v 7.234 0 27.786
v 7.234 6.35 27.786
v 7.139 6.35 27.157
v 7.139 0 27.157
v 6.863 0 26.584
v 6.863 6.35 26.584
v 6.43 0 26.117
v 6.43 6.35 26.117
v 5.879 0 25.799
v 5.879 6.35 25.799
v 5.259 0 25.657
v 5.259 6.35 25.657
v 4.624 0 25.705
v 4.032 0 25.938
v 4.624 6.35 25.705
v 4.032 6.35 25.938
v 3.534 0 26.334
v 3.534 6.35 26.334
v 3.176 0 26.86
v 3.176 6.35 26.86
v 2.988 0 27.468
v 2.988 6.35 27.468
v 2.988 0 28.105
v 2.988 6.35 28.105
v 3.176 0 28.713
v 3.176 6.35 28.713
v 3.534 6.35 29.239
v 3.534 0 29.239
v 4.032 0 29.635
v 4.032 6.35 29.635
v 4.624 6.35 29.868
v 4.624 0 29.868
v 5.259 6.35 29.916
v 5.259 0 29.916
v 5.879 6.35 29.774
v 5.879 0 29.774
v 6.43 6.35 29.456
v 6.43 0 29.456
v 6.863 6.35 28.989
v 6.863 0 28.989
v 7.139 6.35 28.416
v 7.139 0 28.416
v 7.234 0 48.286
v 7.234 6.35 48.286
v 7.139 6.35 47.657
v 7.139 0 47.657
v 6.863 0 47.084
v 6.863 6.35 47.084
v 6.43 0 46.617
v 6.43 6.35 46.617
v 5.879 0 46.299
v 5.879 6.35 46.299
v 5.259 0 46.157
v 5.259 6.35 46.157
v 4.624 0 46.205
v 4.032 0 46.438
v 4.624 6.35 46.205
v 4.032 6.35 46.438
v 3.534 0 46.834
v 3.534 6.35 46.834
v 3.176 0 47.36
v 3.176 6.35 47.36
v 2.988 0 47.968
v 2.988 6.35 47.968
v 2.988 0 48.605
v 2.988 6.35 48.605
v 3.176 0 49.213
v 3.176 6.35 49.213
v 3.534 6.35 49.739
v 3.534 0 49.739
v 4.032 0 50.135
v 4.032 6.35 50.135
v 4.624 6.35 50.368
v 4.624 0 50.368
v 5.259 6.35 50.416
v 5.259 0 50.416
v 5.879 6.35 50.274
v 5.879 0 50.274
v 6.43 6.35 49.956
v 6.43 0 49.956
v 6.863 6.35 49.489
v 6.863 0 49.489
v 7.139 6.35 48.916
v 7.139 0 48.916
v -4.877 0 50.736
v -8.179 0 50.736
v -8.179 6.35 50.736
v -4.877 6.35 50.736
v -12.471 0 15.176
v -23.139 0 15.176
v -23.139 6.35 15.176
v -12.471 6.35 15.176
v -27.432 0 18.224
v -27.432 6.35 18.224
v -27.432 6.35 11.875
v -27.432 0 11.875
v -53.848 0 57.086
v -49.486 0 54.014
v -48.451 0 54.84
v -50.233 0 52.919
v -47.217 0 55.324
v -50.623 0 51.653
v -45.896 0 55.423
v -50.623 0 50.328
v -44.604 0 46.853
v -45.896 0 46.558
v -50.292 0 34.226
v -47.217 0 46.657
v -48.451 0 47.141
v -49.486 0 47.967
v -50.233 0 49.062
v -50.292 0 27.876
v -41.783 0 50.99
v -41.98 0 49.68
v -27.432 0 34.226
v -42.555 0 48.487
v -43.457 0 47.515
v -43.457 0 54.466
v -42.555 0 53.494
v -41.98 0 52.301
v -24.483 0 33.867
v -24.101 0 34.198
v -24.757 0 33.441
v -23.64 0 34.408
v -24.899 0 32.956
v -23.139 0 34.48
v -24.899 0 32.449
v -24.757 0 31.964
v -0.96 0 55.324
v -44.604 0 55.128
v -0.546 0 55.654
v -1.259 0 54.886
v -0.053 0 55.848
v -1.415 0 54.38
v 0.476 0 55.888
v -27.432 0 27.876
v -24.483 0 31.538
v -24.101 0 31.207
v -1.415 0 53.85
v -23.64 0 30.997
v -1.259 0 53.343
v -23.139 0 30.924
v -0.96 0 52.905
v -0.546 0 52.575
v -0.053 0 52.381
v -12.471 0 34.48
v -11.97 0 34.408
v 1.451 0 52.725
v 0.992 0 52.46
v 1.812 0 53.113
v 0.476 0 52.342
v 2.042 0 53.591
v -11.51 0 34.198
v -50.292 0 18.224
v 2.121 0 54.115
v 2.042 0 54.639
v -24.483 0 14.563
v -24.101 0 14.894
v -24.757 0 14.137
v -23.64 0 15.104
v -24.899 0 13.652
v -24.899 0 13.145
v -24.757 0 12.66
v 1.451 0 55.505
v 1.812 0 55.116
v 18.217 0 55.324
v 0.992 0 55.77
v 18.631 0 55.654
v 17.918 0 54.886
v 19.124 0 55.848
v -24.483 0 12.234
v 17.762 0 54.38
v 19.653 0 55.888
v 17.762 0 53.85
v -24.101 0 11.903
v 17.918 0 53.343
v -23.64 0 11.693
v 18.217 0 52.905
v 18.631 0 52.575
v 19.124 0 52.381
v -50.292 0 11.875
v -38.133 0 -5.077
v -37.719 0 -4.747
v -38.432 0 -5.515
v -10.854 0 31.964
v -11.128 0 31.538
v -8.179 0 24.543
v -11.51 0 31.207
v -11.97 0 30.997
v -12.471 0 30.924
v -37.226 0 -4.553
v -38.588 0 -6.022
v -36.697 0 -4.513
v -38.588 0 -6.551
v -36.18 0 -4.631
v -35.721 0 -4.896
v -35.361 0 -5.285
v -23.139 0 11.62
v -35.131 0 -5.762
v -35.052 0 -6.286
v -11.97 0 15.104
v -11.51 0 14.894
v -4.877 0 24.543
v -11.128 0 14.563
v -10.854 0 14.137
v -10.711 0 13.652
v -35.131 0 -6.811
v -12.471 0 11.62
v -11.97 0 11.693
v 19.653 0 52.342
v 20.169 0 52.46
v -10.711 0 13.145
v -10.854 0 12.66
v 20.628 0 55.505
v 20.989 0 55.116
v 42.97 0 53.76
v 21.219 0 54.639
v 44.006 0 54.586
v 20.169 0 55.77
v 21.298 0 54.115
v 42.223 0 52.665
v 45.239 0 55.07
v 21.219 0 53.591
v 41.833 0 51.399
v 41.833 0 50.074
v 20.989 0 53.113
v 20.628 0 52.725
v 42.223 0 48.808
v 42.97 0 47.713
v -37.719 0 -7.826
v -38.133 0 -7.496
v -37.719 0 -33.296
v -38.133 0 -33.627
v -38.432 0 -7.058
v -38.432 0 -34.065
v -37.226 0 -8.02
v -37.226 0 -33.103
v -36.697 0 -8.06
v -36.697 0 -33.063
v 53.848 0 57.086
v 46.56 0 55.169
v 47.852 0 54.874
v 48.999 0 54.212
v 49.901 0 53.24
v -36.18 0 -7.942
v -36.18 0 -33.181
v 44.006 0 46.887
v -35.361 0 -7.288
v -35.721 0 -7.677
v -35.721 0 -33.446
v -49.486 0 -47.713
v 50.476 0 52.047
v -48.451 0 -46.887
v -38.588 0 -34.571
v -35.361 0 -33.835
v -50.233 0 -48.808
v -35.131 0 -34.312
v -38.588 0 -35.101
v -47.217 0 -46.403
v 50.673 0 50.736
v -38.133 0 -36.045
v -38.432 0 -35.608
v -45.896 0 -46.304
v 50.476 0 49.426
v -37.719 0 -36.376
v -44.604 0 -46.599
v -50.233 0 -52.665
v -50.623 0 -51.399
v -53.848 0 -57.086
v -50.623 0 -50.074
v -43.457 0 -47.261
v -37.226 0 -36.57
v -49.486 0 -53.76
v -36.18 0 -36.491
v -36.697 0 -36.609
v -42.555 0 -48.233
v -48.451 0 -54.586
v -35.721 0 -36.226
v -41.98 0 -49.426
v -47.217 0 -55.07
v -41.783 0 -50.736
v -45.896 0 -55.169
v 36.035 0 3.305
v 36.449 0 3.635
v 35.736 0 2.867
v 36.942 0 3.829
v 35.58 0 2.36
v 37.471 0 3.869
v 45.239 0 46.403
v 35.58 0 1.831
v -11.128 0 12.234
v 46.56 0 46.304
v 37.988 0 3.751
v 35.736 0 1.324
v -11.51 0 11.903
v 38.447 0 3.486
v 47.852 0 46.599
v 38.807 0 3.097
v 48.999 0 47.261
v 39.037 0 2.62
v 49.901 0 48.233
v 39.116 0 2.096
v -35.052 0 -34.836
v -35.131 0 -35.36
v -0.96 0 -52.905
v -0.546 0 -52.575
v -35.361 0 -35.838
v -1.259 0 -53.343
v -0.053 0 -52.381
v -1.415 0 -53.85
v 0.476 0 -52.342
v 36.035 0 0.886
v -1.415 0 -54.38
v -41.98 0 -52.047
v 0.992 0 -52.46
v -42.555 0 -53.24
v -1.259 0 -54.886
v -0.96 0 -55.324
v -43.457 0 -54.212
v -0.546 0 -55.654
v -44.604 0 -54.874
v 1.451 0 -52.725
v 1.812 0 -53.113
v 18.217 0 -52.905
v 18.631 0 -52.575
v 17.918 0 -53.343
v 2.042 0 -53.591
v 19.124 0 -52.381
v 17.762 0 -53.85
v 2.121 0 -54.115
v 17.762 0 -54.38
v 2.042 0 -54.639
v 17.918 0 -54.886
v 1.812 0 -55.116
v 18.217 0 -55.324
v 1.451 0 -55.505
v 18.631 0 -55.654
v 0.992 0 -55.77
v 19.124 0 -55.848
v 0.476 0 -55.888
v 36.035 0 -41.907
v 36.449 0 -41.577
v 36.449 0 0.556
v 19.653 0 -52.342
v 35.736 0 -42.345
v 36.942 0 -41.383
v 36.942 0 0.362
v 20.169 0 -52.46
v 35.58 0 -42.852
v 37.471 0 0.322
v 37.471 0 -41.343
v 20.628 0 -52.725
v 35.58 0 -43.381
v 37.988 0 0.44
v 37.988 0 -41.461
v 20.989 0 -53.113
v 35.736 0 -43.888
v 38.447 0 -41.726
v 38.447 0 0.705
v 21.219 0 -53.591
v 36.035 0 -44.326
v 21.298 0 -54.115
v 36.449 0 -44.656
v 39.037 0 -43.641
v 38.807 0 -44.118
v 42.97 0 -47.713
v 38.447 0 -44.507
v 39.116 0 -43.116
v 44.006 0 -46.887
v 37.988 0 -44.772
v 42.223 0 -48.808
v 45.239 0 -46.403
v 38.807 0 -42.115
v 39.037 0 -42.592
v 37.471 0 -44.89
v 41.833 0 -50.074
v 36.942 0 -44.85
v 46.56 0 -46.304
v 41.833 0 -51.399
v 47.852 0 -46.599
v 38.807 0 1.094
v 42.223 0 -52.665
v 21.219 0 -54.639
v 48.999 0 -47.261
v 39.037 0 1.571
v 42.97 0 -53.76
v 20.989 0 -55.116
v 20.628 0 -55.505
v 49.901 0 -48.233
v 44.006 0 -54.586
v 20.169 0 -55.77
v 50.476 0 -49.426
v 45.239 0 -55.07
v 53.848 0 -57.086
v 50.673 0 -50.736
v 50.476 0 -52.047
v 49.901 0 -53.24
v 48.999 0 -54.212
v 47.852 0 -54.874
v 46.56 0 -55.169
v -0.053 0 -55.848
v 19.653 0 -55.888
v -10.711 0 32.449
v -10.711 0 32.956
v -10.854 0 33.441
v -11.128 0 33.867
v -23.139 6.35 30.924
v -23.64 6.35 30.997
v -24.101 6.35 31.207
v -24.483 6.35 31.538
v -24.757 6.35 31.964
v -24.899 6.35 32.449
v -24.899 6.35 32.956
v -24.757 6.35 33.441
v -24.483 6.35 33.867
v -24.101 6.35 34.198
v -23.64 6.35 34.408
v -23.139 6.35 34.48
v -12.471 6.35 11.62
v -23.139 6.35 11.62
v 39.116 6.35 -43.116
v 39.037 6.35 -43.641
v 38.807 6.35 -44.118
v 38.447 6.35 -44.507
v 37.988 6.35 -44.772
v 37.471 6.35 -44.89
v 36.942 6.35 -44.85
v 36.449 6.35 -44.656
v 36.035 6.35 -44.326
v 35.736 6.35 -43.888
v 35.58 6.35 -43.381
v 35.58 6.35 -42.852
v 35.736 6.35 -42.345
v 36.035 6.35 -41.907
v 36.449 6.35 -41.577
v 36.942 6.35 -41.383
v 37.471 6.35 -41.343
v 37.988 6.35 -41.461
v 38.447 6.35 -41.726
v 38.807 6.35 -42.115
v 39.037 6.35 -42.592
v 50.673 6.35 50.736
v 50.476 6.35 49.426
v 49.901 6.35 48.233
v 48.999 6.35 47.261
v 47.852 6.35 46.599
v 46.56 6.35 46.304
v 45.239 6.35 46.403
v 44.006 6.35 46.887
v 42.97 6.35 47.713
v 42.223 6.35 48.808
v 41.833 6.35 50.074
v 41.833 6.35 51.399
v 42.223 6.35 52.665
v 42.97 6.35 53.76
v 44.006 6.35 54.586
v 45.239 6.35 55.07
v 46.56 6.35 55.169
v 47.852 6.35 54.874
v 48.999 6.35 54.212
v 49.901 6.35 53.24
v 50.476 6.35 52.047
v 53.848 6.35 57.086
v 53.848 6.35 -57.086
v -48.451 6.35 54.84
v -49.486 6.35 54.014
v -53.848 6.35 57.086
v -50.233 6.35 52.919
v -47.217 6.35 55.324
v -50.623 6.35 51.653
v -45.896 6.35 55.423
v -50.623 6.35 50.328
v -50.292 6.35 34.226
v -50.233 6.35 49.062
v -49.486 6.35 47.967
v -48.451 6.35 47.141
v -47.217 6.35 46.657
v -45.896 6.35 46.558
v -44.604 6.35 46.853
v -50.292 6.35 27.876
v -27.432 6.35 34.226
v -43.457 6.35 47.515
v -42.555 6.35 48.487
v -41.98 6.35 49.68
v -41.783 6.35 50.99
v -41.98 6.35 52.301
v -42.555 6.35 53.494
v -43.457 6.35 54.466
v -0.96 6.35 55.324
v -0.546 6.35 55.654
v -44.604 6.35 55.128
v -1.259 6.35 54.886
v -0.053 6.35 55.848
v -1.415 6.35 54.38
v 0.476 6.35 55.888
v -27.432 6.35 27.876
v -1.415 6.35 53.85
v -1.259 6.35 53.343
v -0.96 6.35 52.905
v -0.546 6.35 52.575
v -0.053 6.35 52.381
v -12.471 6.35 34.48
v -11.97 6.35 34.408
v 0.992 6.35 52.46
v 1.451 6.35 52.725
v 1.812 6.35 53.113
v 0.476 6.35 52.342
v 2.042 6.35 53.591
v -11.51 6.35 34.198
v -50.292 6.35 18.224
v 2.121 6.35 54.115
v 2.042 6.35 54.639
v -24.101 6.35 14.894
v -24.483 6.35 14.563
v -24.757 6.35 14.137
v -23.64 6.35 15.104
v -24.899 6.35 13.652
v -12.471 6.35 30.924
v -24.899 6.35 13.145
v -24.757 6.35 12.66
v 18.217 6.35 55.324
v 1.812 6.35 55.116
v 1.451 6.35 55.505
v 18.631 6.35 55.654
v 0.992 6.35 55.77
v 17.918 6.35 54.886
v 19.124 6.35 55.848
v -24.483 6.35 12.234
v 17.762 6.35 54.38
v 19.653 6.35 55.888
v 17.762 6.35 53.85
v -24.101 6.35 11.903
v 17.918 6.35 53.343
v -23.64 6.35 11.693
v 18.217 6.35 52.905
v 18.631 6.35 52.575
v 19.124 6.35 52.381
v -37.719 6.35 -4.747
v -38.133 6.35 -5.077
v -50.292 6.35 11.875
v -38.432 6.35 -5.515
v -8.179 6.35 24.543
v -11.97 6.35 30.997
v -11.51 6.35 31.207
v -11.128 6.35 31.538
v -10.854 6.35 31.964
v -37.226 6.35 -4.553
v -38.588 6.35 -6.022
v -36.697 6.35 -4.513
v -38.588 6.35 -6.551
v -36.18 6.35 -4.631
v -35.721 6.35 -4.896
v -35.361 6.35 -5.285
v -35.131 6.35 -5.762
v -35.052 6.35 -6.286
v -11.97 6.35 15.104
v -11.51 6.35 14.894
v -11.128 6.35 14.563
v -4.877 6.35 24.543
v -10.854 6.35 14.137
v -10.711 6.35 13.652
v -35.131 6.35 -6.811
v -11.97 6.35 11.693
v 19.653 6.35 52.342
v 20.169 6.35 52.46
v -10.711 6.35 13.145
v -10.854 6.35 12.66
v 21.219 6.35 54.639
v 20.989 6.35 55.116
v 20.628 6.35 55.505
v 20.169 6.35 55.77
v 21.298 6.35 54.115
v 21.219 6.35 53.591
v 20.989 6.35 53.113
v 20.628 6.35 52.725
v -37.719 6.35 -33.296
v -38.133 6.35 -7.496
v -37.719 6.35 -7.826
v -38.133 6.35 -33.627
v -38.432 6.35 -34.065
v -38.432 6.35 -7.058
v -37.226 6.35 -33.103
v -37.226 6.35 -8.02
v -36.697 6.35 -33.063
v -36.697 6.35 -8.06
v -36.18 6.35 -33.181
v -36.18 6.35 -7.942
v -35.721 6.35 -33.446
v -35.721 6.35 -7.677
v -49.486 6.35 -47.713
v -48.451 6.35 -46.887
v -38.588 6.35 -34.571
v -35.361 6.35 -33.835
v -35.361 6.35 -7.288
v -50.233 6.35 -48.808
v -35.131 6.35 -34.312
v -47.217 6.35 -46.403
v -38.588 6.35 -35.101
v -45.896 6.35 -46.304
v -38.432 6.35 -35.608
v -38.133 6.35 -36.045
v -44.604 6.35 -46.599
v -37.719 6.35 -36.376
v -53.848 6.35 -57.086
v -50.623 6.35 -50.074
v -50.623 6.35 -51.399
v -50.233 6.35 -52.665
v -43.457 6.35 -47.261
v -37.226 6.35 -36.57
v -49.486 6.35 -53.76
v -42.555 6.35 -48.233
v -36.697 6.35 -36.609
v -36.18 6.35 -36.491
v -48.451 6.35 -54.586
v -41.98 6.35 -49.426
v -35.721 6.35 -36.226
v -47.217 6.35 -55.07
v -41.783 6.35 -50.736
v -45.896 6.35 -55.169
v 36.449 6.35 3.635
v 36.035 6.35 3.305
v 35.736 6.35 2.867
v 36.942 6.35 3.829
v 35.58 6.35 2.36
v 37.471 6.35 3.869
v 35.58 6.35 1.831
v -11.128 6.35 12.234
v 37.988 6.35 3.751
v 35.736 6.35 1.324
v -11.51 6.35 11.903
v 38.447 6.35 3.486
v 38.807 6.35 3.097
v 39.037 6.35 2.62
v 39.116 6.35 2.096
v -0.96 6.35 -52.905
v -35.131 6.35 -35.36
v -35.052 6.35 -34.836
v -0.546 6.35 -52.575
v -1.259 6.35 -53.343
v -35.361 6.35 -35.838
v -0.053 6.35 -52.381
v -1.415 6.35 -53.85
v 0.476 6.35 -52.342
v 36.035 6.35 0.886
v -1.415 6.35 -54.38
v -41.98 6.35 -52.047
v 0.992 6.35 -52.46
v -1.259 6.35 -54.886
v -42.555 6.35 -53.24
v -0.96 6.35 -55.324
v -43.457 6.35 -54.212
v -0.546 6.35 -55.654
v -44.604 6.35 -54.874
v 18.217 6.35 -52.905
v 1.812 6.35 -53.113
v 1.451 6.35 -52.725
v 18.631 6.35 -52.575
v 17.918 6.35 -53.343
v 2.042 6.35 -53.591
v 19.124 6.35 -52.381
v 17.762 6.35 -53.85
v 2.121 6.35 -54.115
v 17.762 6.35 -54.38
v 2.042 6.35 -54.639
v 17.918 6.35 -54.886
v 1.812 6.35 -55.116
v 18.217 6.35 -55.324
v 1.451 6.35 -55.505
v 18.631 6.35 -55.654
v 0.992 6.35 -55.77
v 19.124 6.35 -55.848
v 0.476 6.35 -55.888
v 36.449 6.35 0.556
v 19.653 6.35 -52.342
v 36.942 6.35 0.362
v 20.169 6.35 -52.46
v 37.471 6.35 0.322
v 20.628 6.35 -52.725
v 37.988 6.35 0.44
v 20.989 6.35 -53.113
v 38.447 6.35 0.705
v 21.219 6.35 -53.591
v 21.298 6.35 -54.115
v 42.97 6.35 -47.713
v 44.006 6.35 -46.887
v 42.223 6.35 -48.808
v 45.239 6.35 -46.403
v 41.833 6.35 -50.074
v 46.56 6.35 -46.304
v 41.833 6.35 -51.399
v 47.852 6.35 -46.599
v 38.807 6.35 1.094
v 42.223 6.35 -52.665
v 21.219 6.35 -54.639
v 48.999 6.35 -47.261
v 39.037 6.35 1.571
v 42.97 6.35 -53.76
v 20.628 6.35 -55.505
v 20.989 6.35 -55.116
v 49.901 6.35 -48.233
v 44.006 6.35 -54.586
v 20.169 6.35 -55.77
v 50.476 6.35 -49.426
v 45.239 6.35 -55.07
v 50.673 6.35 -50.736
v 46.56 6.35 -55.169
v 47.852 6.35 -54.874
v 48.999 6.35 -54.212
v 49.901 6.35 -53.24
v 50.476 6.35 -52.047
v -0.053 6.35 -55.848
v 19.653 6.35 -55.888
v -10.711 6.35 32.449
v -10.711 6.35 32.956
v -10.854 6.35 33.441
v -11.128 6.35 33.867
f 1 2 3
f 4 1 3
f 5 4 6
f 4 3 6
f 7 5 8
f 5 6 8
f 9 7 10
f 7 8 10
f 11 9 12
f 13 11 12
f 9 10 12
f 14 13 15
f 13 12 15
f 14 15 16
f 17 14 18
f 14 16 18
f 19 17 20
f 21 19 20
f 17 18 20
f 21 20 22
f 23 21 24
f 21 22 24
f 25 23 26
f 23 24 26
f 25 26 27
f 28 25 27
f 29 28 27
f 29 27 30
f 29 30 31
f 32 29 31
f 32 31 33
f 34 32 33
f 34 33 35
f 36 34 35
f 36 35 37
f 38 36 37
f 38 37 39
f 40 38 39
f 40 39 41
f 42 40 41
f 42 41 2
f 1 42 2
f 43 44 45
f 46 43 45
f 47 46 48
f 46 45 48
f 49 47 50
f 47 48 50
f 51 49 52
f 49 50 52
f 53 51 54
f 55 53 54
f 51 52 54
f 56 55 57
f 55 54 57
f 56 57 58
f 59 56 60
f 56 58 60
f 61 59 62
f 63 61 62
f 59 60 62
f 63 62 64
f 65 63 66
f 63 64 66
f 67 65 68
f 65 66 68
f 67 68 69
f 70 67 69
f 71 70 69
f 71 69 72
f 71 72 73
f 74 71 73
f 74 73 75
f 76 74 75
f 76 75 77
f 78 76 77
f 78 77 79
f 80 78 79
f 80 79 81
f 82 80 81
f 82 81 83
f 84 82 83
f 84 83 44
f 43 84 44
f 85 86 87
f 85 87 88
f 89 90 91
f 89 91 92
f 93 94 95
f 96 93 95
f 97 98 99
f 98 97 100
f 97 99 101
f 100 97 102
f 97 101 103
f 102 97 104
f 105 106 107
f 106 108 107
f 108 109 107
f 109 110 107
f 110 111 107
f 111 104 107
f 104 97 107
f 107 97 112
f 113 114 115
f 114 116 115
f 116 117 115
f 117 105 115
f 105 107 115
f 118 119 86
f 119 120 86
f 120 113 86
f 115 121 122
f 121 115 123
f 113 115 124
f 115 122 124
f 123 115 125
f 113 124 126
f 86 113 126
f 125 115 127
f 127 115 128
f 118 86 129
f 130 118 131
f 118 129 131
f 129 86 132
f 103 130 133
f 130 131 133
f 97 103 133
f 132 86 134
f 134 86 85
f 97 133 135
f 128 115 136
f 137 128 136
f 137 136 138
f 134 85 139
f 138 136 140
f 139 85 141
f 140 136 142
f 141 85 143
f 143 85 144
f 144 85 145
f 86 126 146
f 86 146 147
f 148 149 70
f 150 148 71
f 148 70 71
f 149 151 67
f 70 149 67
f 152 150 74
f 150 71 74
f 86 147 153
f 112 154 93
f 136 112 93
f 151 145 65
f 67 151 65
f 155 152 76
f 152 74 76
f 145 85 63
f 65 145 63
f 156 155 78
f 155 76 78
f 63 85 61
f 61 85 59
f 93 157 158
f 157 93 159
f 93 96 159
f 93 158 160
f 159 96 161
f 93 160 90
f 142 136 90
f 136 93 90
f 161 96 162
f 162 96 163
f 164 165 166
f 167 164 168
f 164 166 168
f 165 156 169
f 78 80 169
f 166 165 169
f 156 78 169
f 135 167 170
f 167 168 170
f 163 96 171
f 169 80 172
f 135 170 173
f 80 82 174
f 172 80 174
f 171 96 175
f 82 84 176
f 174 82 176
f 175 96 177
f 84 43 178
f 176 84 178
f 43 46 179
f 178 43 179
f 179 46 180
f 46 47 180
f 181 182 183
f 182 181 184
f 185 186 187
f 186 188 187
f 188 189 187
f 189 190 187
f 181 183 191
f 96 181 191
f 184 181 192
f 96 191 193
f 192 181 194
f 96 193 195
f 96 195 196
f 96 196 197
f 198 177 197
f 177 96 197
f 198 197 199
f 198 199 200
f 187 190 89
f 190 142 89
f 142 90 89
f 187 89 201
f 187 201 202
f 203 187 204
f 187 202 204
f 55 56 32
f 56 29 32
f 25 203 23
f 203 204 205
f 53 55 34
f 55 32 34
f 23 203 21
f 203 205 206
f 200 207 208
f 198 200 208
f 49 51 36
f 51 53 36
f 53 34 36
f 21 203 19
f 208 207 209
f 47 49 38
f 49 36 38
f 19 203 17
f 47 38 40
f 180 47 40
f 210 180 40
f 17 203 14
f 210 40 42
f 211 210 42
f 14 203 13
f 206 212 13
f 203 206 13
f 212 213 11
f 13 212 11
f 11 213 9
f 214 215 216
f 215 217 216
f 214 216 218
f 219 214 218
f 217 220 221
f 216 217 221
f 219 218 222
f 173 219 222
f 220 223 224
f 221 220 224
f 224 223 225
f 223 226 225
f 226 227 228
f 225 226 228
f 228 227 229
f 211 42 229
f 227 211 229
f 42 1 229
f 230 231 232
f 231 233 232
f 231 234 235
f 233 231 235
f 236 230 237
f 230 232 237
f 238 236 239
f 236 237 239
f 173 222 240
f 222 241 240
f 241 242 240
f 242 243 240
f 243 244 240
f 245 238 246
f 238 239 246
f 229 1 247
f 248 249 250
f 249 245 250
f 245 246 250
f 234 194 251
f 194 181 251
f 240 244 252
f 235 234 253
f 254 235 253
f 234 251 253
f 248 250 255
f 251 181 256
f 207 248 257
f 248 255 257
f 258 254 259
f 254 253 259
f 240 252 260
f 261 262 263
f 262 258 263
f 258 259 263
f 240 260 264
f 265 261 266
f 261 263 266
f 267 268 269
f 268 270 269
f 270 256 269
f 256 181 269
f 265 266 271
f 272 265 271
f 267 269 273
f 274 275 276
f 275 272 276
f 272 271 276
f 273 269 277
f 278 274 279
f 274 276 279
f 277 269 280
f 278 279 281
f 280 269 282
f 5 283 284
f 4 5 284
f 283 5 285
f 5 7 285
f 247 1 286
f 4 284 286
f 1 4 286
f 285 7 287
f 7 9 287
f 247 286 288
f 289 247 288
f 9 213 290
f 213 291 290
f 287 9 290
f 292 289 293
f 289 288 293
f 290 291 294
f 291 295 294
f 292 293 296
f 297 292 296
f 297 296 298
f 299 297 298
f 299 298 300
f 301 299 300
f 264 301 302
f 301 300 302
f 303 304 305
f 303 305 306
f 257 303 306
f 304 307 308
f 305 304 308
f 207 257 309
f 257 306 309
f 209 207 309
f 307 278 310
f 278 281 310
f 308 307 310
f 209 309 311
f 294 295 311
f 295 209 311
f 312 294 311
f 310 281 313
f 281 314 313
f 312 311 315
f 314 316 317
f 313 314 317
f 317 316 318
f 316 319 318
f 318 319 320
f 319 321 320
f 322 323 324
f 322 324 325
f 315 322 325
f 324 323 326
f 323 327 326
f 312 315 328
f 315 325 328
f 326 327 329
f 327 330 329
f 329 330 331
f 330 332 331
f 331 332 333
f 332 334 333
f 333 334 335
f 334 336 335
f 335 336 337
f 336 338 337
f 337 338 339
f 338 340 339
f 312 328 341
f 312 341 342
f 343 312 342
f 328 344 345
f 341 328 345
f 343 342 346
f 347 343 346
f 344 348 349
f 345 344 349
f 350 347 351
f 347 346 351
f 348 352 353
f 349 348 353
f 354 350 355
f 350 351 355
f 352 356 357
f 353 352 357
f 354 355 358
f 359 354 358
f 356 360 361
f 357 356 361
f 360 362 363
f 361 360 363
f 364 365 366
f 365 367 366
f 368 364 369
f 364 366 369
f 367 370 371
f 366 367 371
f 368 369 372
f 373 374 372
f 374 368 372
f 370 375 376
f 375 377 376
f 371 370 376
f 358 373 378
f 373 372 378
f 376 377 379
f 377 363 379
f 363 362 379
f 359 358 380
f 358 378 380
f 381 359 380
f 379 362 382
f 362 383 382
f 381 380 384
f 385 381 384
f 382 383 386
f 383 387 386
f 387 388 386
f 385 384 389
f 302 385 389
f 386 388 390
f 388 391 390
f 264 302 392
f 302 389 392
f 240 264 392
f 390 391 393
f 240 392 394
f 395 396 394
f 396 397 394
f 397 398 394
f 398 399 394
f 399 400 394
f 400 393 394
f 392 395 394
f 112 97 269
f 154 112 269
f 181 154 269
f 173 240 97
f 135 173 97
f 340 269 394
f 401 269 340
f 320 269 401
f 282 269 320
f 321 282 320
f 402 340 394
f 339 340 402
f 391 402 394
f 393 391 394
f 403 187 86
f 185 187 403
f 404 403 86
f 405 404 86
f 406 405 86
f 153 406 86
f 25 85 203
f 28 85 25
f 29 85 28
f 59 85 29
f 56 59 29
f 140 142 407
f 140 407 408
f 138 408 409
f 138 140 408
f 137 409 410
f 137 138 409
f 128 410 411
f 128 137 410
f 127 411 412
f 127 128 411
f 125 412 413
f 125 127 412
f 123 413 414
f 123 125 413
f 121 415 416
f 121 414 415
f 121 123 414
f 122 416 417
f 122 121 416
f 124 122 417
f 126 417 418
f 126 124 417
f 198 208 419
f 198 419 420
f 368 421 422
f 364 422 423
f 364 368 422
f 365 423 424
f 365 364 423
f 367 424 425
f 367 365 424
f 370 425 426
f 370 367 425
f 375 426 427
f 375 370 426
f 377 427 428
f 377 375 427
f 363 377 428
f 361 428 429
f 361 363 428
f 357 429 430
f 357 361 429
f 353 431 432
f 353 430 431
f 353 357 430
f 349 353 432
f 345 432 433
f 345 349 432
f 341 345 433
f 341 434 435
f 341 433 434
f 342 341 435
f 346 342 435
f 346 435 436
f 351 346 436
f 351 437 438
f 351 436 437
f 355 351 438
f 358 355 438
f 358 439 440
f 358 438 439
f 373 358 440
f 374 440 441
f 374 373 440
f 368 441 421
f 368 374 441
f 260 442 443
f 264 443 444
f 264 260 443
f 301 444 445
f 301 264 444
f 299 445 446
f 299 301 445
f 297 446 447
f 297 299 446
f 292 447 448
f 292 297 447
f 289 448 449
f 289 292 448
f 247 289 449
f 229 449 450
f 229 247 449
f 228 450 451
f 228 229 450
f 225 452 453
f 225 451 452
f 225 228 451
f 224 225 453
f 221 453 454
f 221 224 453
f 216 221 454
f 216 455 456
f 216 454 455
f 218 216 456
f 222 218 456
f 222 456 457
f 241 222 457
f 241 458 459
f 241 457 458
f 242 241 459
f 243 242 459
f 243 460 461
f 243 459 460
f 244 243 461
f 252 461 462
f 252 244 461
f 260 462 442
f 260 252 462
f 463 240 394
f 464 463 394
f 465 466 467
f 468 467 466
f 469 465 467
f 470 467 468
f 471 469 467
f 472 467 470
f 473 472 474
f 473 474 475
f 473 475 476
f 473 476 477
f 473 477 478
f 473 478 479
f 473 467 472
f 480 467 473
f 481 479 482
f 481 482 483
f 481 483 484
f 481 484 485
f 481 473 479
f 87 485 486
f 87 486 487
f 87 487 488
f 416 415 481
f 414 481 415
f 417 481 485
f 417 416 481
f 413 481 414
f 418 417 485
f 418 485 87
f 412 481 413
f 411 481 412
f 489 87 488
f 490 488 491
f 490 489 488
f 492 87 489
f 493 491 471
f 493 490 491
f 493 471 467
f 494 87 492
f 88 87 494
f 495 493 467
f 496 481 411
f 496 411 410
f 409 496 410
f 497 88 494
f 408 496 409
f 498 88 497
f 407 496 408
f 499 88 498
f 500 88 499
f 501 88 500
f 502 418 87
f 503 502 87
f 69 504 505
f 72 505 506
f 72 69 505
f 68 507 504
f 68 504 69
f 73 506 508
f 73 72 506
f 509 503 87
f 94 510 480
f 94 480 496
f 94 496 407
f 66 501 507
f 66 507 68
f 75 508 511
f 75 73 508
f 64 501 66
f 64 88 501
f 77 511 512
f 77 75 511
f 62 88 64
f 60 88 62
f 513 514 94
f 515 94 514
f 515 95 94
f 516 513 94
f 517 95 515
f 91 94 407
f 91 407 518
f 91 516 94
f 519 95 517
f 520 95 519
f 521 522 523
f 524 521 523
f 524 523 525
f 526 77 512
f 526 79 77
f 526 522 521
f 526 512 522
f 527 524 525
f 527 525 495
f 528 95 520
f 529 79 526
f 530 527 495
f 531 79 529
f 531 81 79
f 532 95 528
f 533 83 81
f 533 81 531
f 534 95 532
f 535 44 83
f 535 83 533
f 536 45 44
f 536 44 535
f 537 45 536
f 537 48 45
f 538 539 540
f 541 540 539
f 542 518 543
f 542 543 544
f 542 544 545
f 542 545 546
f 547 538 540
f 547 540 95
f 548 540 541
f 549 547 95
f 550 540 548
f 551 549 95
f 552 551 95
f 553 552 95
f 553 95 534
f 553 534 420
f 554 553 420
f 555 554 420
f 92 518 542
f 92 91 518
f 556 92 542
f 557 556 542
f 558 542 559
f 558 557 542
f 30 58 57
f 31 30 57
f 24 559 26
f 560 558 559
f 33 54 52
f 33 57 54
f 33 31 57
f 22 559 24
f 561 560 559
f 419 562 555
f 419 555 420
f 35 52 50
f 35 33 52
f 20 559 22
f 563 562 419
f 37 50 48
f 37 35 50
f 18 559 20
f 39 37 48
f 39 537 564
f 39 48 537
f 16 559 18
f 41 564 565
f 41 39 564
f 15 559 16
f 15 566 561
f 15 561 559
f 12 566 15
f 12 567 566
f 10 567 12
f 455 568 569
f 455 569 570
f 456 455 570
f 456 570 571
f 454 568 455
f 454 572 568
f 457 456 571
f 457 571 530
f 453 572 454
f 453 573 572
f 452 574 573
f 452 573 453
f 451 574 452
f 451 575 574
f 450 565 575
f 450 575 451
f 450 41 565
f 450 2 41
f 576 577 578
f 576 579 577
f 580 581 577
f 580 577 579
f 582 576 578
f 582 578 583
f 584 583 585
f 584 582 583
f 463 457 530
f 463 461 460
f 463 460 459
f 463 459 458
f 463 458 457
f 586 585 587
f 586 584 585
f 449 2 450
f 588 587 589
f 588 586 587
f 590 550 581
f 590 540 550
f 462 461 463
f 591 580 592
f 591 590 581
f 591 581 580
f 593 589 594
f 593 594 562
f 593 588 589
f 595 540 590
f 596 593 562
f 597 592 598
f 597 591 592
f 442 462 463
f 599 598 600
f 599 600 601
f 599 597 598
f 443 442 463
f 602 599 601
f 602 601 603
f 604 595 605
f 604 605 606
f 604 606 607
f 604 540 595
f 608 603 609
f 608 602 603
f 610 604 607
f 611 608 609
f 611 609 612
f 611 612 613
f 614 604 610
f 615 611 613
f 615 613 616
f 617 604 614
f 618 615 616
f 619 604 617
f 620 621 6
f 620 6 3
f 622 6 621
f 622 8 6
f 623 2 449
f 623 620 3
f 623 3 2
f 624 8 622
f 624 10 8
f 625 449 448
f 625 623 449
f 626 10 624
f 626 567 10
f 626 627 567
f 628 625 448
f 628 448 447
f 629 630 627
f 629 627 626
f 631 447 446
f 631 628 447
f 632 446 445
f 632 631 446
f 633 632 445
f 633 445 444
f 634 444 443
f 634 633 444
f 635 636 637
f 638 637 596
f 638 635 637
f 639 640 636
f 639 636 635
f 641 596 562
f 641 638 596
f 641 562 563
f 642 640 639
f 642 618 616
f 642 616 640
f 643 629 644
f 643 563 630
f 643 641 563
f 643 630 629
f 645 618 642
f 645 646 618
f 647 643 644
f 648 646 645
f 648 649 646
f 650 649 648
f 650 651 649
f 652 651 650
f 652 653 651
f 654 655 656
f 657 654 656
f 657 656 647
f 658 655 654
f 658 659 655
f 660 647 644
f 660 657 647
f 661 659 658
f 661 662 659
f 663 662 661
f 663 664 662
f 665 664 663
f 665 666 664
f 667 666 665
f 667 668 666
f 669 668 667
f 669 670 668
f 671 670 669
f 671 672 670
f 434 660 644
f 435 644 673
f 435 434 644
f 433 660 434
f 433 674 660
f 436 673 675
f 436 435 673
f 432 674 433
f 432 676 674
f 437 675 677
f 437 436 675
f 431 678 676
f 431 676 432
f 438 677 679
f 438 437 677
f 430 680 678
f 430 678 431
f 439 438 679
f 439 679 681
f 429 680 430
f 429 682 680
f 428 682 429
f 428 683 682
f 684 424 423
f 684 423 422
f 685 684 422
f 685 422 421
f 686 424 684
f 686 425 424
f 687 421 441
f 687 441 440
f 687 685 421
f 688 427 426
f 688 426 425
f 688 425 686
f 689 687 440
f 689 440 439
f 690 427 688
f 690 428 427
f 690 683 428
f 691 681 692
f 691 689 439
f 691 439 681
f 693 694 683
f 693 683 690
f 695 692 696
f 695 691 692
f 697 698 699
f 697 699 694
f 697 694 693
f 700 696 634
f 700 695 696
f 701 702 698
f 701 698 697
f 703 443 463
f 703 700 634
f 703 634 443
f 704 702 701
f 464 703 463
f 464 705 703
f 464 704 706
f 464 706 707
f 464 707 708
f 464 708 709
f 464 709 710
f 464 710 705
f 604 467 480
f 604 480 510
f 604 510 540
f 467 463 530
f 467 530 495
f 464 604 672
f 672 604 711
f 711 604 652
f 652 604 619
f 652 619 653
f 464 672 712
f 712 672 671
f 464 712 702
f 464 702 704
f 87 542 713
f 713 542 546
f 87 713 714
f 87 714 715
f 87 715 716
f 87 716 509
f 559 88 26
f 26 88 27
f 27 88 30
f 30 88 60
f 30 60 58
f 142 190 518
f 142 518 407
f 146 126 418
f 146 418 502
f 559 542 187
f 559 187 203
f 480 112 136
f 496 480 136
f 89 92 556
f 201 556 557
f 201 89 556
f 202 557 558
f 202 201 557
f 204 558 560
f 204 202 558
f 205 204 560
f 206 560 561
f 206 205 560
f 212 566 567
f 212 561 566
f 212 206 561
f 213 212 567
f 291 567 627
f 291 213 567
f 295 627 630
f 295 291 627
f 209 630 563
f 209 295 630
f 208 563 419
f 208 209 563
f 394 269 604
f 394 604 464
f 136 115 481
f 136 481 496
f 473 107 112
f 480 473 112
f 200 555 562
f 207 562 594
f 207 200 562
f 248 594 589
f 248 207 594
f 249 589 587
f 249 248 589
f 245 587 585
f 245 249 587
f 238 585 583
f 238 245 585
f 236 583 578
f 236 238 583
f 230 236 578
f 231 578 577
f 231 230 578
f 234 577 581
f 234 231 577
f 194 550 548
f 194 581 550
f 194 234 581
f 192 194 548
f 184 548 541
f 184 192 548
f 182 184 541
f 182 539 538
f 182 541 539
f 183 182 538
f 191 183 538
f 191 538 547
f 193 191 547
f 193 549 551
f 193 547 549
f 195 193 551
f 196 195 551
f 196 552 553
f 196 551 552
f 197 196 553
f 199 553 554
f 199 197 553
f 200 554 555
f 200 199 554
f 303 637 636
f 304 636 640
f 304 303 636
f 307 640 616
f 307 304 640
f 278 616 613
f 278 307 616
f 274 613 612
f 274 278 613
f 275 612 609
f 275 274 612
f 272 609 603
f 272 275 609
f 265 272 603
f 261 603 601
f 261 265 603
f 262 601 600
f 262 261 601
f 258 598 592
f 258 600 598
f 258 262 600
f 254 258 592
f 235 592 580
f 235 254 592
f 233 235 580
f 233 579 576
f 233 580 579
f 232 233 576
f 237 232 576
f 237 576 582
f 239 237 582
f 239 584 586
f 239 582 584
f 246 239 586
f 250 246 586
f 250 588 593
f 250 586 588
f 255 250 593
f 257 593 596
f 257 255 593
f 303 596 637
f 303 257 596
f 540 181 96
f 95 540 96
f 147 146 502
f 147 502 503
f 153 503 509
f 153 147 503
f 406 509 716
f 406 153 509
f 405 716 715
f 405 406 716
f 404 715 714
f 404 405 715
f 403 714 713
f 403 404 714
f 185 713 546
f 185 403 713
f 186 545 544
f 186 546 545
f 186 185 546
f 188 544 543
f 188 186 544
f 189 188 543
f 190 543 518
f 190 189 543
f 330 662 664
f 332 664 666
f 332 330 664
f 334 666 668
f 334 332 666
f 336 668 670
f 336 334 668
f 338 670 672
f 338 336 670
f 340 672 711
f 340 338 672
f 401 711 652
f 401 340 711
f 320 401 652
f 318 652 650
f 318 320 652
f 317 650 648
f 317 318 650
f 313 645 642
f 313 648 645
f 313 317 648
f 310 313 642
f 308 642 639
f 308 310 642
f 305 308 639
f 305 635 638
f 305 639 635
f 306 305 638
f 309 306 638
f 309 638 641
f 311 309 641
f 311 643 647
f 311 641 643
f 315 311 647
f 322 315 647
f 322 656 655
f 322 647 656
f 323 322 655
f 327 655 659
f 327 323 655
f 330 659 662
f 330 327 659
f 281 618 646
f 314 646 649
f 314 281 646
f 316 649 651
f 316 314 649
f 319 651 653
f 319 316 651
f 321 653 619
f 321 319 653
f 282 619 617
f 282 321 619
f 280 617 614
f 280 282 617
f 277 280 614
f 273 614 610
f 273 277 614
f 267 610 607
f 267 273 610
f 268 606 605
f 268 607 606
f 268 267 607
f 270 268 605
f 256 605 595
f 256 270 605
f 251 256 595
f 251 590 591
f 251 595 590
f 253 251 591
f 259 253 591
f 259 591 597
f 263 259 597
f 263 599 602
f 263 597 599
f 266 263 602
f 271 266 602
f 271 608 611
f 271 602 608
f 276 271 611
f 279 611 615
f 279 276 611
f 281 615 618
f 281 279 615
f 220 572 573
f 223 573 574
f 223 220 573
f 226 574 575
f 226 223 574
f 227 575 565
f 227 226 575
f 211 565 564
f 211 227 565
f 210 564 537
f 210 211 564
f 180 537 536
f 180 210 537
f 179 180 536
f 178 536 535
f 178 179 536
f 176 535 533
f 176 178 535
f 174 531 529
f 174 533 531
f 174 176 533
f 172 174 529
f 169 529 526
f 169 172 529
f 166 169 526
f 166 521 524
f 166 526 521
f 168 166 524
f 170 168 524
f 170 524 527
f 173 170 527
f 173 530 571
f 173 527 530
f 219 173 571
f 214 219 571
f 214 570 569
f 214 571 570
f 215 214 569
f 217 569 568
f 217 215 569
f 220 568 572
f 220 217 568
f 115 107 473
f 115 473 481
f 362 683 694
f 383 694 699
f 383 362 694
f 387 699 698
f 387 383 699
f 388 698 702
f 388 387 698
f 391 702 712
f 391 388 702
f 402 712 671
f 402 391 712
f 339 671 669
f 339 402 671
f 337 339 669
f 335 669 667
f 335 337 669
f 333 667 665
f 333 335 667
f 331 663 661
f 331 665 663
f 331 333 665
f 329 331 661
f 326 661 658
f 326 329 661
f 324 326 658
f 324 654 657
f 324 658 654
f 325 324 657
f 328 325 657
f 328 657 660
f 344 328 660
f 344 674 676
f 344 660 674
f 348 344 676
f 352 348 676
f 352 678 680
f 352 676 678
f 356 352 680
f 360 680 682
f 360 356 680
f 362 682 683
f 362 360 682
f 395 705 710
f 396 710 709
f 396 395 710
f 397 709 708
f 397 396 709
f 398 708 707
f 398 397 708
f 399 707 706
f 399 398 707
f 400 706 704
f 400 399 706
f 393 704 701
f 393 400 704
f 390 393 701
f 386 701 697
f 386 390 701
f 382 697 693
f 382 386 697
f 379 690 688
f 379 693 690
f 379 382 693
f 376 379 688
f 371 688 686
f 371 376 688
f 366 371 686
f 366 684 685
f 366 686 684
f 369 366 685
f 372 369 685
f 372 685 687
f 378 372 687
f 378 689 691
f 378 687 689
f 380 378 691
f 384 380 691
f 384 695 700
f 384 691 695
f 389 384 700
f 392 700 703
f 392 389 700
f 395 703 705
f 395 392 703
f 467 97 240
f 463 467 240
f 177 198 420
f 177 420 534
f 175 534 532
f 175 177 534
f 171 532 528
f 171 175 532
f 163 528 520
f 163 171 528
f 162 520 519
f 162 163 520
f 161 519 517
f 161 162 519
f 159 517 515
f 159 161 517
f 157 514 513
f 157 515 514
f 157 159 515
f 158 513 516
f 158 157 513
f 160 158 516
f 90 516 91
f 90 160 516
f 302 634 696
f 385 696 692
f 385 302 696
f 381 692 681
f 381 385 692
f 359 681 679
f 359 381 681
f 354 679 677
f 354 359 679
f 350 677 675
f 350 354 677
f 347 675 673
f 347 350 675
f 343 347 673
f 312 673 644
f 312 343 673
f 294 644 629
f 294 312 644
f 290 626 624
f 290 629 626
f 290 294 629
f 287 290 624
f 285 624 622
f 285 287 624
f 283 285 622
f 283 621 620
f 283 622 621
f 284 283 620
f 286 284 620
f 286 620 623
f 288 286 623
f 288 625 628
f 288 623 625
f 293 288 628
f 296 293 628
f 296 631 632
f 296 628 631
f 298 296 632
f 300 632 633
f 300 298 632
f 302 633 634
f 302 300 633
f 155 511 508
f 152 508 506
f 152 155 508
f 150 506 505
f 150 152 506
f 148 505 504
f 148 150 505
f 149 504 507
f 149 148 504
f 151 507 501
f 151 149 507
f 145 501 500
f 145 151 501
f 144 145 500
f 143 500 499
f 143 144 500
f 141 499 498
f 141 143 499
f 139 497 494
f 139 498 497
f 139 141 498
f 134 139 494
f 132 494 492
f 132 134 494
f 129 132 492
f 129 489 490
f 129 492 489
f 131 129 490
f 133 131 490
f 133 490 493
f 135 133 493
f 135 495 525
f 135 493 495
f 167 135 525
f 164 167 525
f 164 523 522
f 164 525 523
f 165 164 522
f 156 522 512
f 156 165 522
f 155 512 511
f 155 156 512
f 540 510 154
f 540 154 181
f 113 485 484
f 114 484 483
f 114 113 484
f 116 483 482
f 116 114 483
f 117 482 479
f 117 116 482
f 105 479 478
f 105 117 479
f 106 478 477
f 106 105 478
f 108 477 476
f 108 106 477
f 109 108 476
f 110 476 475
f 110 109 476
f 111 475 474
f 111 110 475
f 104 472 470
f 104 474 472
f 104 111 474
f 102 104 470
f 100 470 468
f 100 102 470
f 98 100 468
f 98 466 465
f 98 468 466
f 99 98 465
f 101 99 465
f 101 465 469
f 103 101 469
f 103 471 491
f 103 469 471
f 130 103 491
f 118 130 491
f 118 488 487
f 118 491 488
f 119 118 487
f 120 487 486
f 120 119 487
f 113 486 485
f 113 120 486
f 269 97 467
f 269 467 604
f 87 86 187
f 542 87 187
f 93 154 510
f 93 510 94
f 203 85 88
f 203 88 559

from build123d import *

# Parameters (mm, degrees)
ESQUISSE1_W             = 107.696
ESQUISSE1_H             = 114.173
BOSS_EXTRU_1_DEPTH      = 6.35
ESQUISSE1_6_OUTSIDE_W   = 141.112
ESQUISSE1_6_OUTSIDE_H   = 147.588
ESQUISSE1_6_OUTSIDE_W_2 = 107.696
ESQUISSE1_6_OUTSIDE_H_2 = 114.173
ESQUISSE1_6_OUTSIDE_R   = 1.778
ESQUISSE1_6_OUTSIDE_R_2 = 4.445
ESQUISSE1_6_OUTSIDE_W_3 = 3.302
ESQUISSE1_6_OUTSIDE_H_3 = 25.4
ESQUISSE1_6_OUTSIDE_W_4 = 22.86
ESQUISSE1_6_OUTSIDE_H_4 = 6.35
ENL_V_MAT_EXTRU_3_DEPTH = 7.35
ESQUISSE2_R             = 1.778
BOSS_EXTRU_2_DEPTH      = 6.35
ESQUISSE3_R             = 2.135000048
ESQUISSE3_W             = 3.302
ESQUISSE3_H             = 0.79375
ENL_V_MAT_EXTRU_4_DEPTH = 7.35


with BuildPart() as part:
    # Esquisse1 → Boss.-Extru.1 (new body)
    with BuildSketch(Plane(origin=(0, 0, 0), x_dir=(1, 0, 0), z_dir=(0, 1, 0))):
        Rectangle(ESQUISSE1_W, ESQUISSE1_H)
    extrude(amount=BOSS_EXTRU_1_DEPTH)

    # Esquisse1<6> outside → Enlèv. mat.-Extru.3 (cut, through all)
    with BuildSketch(Plane(origin=(0, 0, 0), x_dir=(1, 0, 0), z_dir=(0, 1, 0))):
        Rectangle(ESQUISSE1_6_OUTSIDE_W, ESQUISSE1_6_OUTSIDE_H)
        Rectangle(ESQUISSE1_6_OUTSIDE_W_2, ESQUISSE1_6_OUTSIDE_H_2, mode=Mode.SUBTRACT)
        with Locations((0.3429, -54.1147)):
            Circle(ESQUISSE1_6_OUTSIDE_R)
        with Locations((19.5199, -54.1147)):
            Circle(ESQUISSE1_6_OUTSIDE_R)
        with Locations((6.858, -49.9745)):
            Circle(ESQUISSE1_6_OUTSIDE_R)
        with Locations((6.858, -30.6705)):
            Circle(ESQUISSE1_6_OUTSIDE_R)
        with Locations((-4.572, -23.0505)):
            Circle(ESQUISSE1_6_OUTSIDE_R)
        with Locations((46.228, -50.7365)):
            Circle(ESQUISSE1_6_OUTSIDE_R_2)
        with Locations((46.228, 50.7365)):
            Circle(ESQUISSE1_6_OUTSIDE_R_2)
        with Locations((37.338, 43.1165)):
            Circle(ESQUISSE1_6_OUTSIDE_R)
        with Locations((37.338, -2.0955)):
            Circle(ESQUISSE1_6_OUTSIDE_R)
        with Locations((-36.83, 34.8361)):
            Circle(ESQUISSE1_6_OUTSIDE_R)
        with Locations((-36.83, 6.2865)):
            Circle(ESQUISSE1_6_OUTSIDE_R)
        with Locations((19.5199, 54.1147)):
            Circle(ESQUISSE1_6_OUTSIDE_R)
        with Locations((0.3429, 54.1147)):
            Circle(ESQUISSE1_6_OUTSIDE_R)
        with Locations((-46.228, 50.7365)):
            Circle(ESQUISSE1_6_OUTSIDE_R_2)
        with Locations((-46.228, -50.9905)):
            Circle(ESQUISSE1_6_OUTSIDE_R_2)
        with Locations((-6.5278, -38.0365)):
            Rectangle(ESQUISSE1_6_OUTSIDE_W_3, ESQUISSE1_6_OUTSIDE_H_3)
        with Locations((-38.862, -15.0495)):
            Rectangle(ESQUISSE1_6_OUTSIDE_W_4, ESQUISSE1_6_OUTSIDE_H_4)
        with Locations((-38.862, -31.0515)):
            Rectangle(ESQUISSE1_6_OUTSIDE_W_4, ESQUISSE1_6_OUTSIDE_H_4)
        with BuildLine():
            Line((-23.1394, -34.4805), (-12.4714, -34.4805))
            ThreePointArc((-12.4714, -34.4805), (-10.6934, -32.7025), (-12.4714, -30.9245))
            Line((-12.4714, -30.9245), (-23.1394, -30.9245))
            ThreePointArc((-23.1394, -30.9245), (-24.9174, -32.7025), (-23.1394, -34.4805))
        make_face()
        with BuildLine():
            Line((-23.1394, -15.1765), (-12.4714, -15.1765))
            ThreePointArc((-12.4714, -15.1765), (-10.6934, -13.3985), (-12.4714, -11.6205))
            Line((-12.4714, -11.6205), (-23.1394, -11.6205))
            ThreePointArc((-23.1394, -11.6205), (-24.9174, -13.3985), (-23.1394, -15.1765))
        make_face()
    extrude(amount=ENL_V_MAT_EXTRU_3_DEPTH, mode=Mode.SUBTRACT)

    # Esquisse2 → Boss.-Extru.2 (add)
    with BuildSketch(Plane(origin=(0, 6.35, 0), x_dir=(1, 0, 0), z_dir=(0, 1, 0))):
        with Locations((-4.572, -23.0505)):
            Circle(ESQUISSE2_R)
        with Locations((6.858, -30.6705)):
            Circle(ESQUISSE2_R)
        with Locations((6.858, -49.9745)):
            Circle(ESQUISSE2_R)
    extrude(amount=-BOSS_EXTRU_2_DEPTH)

    # Esquisse3 → Enlèv. mat.-Extru.4 (cut, through all)
    with BuildSketch(Plane(origin=(0, 6.35, 0), x_dir=(1, 0, 0), z_dir=(0, 1, 0))):
        with Locations((5.0992, -27.7865)):
            Circle(ESQUISSE3_R)
        with Locations((5.0992, -48.2865)):
            Circle(ESQUISSE3_R)
        with Locations((-6.5278, -24.939625)):
            Rectangle(ESQUISSE3_W, ESQUISSE3_H)
    extrude(amount=-ENL_V_MAT_EXTRU_4_DEPTH, mode=Mode.SUBTRACT)


solid = part.part
